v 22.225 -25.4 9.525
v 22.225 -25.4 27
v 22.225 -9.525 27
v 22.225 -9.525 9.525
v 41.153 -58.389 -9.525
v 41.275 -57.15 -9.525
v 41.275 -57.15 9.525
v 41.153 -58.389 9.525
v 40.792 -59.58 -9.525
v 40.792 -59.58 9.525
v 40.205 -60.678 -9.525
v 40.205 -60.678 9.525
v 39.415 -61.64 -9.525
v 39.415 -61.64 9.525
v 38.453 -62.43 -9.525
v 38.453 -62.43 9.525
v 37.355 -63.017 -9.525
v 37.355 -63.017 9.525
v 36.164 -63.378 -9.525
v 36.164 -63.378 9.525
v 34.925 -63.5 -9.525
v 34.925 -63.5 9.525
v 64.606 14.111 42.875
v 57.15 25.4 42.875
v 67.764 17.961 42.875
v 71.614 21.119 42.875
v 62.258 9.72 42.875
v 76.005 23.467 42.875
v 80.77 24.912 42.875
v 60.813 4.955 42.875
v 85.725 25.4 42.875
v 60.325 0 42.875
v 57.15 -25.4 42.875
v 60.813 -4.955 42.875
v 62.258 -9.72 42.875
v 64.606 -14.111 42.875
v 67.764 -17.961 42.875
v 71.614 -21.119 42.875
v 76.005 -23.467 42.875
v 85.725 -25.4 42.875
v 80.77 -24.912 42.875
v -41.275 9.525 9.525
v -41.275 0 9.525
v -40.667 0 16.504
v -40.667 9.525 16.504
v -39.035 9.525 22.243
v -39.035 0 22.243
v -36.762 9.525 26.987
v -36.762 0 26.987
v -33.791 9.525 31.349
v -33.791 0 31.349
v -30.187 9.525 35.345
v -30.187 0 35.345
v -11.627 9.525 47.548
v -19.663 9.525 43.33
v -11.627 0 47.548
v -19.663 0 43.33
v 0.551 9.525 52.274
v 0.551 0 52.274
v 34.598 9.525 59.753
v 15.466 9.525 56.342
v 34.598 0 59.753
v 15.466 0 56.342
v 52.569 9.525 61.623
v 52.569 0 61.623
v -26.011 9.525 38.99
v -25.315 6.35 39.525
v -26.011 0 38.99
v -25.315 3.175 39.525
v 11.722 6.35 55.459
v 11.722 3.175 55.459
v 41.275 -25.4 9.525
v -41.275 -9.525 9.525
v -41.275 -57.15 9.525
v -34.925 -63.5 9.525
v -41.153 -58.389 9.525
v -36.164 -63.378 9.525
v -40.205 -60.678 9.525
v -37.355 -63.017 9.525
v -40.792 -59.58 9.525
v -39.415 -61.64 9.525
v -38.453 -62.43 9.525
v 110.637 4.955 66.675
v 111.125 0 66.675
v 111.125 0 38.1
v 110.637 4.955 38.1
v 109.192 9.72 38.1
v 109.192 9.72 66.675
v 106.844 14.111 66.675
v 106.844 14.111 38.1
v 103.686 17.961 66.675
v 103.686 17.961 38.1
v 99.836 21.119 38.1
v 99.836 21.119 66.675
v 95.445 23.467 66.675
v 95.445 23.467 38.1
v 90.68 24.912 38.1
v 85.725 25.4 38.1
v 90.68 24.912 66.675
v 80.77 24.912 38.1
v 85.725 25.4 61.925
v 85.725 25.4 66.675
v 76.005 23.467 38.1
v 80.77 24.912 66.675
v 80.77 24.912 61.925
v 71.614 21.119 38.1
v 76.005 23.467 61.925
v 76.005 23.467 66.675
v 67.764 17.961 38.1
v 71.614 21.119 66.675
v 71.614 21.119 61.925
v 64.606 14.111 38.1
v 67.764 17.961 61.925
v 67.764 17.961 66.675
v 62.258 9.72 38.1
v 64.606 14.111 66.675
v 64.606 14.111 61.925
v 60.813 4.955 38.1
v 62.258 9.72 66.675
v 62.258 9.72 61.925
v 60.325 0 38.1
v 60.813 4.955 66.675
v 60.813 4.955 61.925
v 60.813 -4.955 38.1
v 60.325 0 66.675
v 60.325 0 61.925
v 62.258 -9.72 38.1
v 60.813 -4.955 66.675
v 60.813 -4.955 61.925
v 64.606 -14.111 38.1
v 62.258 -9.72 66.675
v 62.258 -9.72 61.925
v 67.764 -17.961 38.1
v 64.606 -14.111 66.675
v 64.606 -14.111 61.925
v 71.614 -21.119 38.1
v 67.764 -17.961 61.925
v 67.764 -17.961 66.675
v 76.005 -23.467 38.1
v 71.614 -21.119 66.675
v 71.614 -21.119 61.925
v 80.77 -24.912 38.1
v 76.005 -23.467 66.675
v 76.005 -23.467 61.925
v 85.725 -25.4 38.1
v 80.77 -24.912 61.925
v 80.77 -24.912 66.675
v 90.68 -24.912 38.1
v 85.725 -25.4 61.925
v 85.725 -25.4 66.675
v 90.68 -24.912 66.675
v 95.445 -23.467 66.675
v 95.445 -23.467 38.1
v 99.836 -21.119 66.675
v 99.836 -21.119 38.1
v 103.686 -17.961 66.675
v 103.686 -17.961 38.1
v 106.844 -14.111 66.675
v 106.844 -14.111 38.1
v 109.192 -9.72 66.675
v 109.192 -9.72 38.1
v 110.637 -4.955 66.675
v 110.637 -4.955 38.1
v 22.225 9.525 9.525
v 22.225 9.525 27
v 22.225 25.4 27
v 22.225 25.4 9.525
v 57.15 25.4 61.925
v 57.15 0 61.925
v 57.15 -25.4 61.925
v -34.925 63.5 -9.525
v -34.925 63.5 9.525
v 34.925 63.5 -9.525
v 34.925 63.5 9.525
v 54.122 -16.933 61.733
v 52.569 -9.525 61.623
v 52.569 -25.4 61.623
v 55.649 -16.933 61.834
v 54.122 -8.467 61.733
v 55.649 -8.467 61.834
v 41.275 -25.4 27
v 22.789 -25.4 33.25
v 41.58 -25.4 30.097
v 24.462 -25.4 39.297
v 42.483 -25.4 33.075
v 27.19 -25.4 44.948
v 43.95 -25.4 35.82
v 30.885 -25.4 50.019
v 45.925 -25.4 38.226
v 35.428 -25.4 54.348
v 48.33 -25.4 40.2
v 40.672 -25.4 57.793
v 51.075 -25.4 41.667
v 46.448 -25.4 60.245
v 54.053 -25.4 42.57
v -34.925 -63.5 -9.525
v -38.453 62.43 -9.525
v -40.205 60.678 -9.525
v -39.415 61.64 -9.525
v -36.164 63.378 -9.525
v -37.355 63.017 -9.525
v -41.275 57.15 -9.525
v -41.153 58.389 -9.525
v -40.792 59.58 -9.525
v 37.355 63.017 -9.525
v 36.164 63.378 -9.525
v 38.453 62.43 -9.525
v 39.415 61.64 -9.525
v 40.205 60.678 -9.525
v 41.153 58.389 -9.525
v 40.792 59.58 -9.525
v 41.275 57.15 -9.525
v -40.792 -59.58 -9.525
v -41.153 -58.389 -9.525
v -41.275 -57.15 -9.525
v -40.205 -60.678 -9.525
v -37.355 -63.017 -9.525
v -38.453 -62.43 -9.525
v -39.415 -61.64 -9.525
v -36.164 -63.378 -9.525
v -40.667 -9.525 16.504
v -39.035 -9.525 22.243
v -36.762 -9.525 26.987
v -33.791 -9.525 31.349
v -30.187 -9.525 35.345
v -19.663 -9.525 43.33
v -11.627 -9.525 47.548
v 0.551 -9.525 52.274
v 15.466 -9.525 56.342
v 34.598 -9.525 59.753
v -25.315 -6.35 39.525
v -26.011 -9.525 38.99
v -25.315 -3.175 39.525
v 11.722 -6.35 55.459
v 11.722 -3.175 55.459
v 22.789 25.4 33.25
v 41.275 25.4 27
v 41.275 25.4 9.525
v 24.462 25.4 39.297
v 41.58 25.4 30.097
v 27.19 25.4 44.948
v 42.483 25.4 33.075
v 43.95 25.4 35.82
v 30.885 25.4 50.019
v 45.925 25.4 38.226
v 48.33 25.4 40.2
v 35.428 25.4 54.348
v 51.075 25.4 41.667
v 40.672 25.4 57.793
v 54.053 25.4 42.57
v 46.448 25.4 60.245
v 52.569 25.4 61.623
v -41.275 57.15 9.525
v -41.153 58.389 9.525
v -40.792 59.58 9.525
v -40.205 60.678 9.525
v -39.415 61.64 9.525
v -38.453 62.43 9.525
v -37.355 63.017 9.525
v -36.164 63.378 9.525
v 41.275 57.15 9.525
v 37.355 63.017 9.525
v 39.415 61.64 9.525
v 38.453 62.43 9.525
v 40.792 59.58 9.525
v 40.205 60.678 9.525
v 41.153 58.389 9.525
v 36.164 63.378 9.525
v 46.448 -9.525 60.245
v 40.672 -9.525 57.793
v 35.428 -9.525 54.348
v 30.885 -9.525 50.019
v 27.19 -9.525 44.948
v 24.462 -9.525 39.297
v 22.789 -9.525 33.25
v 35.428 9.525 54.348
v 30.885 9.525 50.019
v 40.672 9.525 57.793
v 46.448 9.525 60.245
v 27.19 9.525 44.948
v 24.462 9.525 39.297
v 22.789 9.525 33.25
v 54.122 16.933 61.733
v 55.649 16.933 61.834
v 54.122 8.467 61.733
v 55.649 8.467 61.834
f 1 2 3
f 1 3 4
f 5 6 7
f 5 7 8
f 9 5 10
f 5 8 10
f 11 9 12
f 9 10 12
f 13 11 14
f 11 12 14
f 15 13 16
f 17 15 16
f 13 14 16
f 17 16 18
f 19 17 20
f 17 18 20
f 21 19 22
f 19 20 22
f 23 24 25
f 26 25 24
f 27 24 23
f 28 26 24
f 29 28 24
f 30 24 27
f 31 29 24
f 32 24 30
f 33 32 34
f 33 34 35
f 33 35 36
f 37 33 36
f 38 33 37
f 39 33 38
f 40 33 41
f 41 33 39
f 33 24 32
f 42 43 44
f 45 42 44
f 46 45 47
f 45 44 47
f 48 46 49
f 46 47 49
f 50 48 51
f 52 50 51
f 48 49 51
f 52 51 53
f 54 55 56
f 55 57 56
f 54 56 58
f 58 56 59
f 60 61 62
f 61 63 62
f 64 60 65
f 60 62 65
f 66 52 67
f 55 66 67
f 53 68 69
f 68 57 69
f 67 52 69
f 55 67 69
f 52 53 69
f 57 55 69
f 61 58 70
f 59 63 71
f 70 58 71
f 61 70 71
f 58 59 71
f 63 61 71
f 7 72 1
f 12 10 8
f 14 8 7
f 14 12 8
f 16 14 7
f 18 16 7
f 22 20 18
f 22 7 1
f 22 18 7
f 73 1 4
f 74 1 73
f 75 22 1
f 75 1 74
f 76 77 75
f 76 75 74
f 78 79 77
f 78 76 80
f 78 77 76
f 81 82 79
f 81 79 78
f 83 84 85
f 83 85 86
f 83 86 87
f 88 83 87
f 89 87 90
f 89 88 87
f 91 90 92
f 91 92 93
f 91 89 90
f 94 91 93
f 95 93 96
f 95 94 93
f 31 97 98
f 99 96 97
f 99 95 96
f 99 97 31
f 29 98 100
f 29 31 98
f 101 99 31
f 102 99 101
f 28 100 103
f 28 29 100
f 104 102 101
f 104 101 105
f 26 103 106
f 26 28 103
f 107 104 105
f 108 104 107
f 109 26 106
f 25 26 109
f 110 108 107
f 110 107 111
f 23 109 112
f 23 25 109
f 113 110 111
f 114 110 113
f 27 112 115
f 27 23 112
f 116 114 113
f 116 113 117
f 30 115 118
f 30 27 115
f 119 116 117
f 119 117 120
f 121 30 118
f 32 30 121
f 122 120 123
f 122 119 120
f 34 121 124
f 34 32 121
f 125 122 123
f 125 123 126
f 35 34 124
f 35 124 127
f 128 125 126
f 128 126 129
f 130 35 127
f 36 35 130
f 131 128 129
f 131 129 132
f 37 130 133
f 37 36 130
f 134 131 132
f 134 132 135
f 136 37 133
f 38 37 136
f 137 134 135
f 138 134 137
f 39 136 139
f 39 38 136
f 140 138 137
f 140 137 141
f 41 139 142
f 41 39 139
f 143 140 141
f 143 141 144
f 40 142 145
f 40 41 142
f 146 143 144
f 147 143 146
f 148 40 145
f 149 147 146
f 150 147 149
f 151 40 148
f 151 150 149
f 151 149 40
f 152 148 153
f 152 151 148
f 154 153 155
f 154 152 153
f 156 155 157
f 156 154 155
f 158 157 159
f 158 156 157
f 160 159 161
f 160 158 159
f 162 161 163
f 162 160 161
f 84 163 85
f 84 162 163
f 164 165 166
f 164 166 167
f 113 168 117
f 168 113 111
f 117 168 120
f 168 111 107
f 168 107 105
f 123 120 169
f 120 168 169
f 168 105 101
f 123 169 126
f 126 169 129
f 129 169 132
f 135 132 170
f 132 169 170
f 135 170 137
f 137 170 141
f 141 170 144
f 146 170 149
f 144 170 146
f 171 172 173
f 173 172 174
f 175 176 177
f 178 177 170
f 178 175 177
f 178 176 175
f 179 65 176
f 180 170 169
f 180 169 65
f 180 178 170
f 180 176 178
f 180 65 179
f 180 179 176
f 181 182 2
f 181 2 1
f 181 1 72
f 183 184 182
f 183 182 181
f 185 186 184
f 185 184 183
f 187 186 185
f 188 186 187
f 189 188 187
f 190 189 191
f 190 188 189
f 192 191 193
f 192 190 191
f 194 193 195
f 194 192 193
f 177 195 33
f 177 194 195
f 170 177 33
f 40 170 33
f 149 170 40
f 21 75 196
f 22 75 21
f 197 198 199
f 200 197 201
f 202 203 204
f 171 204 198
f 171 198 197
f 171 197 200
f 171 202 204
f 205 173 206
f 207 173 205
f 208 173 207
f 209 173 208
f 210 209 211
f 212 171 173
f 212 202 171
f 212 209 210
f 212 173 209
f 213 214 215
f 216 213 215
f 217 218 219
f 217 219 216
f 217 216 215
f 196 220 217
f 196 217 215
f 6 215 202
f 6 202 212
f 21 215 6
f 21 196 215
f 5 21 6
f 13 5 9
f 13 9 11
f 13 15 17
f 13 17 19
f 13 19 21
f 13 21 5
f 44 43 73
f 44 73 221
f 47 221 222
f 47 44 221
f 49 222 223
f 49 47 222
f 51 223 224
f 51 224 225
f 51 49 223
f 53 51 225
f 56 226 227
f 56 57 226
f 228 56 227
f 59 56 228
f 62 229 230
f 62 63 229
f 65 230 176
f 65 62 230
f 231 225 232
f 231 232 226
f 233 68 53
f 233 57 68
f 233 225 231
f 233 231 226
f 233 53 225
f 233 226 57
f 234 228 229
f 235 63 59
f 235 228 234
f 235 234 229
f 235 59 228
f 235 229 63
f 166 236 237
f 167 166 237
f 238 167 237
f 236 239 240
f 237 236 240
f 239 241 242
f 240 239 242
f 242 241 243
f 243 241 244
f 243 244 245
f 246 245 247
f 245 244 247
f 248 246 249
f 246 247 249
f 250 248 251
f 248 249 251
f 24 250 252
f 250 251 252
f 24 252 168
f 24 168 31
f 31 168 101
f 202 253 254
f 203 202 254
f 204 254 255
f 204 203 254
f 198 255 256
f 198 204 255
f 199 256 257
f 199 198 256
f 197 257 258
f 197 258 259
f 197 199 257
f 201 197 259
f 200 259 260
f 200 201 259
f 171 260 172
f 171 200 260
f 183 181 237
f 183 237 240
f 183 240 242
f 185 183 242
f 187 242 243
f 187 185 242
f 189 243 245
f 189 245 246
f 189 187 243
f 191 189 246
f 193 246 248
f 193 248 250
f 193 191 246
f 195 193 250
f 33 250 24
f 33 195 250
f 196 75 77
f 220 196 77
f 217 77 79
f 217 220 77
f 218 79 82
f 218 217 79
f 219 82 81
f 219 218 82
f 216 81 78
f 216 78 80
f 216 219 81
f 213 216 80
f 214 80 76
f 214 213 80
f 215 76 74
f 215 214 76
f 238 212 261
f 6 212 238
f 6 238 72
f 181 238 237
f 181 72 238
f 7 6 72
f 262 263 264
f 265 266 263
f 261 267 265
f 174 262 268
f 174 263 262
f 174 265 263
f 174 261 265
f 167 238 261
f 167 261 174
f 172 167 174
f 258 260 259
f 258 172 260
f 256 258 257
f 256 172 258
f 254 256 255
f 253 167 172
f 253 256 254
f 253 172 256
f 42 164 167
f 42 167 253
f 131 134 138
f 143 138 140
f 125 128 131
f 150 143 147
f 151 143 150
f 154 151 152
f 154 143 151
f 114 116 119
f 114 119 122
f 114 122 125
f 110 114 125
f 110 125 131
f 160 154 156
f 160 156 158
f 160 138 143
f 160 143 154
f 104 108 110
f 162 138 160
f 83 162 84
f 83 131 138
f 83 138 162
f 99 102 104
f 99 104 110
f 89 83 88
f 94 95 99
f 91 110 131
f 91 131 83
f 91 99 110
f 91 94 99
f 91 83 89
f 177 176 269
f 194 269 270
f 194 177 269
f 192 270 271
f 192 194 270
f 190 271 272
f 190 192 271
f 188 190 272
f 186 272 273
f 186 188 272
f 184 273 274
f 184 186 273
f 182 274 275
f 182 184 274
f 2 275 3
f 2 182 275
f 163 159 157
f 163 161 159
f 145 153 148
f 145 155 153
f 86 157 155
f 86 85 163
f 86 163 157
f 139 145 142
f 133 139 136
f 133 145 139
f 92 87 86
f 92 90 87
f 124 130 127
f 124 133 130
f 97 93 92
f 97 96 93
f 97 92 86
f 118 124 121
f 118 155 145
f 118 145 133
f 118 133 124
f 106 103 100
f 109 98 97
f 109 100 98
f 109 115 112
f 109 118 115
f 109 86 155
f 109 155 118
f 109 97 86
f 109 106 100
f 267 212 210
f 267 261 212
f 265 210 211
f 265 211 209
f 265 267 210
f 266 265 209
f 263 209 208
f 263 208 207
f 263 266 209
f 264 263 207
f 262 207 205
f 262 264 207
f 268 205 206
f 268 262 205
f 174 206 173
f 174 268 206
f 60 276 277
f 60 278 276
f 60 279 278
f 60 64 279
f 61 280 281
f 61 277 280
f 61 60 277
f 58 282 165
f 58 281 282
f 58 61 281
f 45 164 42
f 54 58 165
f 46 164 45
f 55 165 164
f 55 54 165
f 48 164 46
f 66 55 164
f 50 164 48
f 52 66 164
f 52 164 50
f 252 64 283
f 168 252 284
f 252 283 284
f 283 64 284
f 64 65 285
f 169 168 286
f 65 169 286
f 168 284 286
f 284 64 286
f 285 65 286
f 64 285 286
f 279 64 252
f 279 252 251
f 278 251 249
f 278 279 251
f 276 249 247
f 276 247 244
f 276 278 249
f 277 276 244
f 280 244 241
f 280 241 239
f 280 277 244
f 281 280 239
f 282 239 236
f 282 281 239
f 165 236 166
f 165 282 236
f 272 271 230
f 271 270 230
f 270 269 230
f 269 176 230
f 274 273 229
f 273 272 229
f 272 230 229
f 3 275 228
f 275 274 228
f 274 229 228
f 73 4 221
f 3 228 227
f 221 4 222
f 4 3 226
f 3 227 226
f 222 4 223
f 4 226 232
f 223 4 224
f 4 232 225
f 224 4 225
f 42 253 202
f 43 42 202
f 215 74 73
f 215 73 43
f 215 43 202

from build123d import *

# Parameters (mm, degrees)
F1_DEPTH = 63.5
F2_DEPTH = 25.4
F0_W     = 25.4
F0_H     = 19.05
F3_DEPTH = 25.4
F4_DEPTH = 9.525
F6_R     = 6.35


with BuildPart() as f1:
    # F0 (on Front) → F1 (new body, symmetric)
    with BuildSketch(Plane.XZ):
        Polygon((-41.275, 9.525), (-41.275, -9.525), (41.275, -9.525), (41.275, 9.525), (22.225, 9.525), align=None)
    extrude(amount=F1_DEPTH, both=True)

    # F0 (on Front) → F2 (join, symmetric)
    with BuildSketch(Plane.XZ):
        with BuildLine():
            Line((22.225, 9.525), (41.275, 9.525))
            Line((41.275, 9.525), (41.275, 27.0002))
            ThreePointArc((41.275, 27.0002), (45.9246798487, 38.2255201513), (57.15, 42.8752))
            Line((57.15, 42.8752), (60.325, 42.8752))
            Line((60.325, 42.8752), (60.325, 61.9252))
            Line((60.325, 61.9252), (57.15, 61.9252))
            add(Edge.make_bspline(
                [(52.5691994145, 61.6234853871), (54.1342180077, 61.7382540245), (55.6631122744, 61.8383375559), (57.15, 61.9252)],
                knots=[106.979089872, 106.979089872, 106.979089872, 106.979089872, 111.5045361635, 111.5045361635, 111.5045361635, 111.5045361635], degree=3))
            ThreePointArc((52.5691994145, 61.6234853871), (30.8846227378, 50.0194437381), (22.225, 27.0002))
            Line((22.225, 27.0002), (22.225, 9.525))
        make_face()
    extrude(amount=F2_DEPTH, both=True)

    # F0 (on Front) → F3 (join, symmetric)
    with BuildSketch(Plane.XZ):
        with Locations((73.025, 52.4002)):
            Rectangle(F0_W, F0_H)
    extrude(amount=F3_DEPTH, both=True)

    # F0 (on Front) → F4 (join, symmetric)
    with BuildSketch(Plane.XZ):
        with BuildLine():
            add(Edge.make_bspline(
                [(-41.275, 9.525), (-41.6103147377, 47.9909608726), (15.5730107622, 58.9104171977), (52.5691994145, 61.6234853871)],
                knots=[0, 0, 0, 0, 106.979089872, 106.979089872, 106.979089872, 106.979089872], degree=3))
            Line((-41.275, 9.525), (22.225, 9.525))
            Line((22.225, 9.525), (22.225, 27.0002))
            ThreePointArc((22.225, 27.0002), (30.8846227378, 50.0194437381), (52.5691994145, 61.6234853871))
        make_face()
    extrude(amount=F4_DEPTH, both=True)

    # F0 (on Front) → F5 (revolve)
    with BuildSketch(Plane.XZ):
        Polygon((85.725, 66.675), (85.725, 61.9252), (85.725, 42.8752), (85.725, 38.1), (111.125, 38.1), (111.125, 66.675), align=None)
    revolve(axis=Axis((85.725, 0, 52.3875), (0, 0, 1)))

    # F6
    f6_edges = [f1.edges().sort_by_distance(p)[0] for p in [
        (-41.275, -63.5, 0),
        (41.275, -63.5, 0),
        (41.275, 63.5, 0),
        (-41.275, 63.5, 0),
    ]]
    fillet(f6_edges, radius=F6_R)


solid = f1.part
